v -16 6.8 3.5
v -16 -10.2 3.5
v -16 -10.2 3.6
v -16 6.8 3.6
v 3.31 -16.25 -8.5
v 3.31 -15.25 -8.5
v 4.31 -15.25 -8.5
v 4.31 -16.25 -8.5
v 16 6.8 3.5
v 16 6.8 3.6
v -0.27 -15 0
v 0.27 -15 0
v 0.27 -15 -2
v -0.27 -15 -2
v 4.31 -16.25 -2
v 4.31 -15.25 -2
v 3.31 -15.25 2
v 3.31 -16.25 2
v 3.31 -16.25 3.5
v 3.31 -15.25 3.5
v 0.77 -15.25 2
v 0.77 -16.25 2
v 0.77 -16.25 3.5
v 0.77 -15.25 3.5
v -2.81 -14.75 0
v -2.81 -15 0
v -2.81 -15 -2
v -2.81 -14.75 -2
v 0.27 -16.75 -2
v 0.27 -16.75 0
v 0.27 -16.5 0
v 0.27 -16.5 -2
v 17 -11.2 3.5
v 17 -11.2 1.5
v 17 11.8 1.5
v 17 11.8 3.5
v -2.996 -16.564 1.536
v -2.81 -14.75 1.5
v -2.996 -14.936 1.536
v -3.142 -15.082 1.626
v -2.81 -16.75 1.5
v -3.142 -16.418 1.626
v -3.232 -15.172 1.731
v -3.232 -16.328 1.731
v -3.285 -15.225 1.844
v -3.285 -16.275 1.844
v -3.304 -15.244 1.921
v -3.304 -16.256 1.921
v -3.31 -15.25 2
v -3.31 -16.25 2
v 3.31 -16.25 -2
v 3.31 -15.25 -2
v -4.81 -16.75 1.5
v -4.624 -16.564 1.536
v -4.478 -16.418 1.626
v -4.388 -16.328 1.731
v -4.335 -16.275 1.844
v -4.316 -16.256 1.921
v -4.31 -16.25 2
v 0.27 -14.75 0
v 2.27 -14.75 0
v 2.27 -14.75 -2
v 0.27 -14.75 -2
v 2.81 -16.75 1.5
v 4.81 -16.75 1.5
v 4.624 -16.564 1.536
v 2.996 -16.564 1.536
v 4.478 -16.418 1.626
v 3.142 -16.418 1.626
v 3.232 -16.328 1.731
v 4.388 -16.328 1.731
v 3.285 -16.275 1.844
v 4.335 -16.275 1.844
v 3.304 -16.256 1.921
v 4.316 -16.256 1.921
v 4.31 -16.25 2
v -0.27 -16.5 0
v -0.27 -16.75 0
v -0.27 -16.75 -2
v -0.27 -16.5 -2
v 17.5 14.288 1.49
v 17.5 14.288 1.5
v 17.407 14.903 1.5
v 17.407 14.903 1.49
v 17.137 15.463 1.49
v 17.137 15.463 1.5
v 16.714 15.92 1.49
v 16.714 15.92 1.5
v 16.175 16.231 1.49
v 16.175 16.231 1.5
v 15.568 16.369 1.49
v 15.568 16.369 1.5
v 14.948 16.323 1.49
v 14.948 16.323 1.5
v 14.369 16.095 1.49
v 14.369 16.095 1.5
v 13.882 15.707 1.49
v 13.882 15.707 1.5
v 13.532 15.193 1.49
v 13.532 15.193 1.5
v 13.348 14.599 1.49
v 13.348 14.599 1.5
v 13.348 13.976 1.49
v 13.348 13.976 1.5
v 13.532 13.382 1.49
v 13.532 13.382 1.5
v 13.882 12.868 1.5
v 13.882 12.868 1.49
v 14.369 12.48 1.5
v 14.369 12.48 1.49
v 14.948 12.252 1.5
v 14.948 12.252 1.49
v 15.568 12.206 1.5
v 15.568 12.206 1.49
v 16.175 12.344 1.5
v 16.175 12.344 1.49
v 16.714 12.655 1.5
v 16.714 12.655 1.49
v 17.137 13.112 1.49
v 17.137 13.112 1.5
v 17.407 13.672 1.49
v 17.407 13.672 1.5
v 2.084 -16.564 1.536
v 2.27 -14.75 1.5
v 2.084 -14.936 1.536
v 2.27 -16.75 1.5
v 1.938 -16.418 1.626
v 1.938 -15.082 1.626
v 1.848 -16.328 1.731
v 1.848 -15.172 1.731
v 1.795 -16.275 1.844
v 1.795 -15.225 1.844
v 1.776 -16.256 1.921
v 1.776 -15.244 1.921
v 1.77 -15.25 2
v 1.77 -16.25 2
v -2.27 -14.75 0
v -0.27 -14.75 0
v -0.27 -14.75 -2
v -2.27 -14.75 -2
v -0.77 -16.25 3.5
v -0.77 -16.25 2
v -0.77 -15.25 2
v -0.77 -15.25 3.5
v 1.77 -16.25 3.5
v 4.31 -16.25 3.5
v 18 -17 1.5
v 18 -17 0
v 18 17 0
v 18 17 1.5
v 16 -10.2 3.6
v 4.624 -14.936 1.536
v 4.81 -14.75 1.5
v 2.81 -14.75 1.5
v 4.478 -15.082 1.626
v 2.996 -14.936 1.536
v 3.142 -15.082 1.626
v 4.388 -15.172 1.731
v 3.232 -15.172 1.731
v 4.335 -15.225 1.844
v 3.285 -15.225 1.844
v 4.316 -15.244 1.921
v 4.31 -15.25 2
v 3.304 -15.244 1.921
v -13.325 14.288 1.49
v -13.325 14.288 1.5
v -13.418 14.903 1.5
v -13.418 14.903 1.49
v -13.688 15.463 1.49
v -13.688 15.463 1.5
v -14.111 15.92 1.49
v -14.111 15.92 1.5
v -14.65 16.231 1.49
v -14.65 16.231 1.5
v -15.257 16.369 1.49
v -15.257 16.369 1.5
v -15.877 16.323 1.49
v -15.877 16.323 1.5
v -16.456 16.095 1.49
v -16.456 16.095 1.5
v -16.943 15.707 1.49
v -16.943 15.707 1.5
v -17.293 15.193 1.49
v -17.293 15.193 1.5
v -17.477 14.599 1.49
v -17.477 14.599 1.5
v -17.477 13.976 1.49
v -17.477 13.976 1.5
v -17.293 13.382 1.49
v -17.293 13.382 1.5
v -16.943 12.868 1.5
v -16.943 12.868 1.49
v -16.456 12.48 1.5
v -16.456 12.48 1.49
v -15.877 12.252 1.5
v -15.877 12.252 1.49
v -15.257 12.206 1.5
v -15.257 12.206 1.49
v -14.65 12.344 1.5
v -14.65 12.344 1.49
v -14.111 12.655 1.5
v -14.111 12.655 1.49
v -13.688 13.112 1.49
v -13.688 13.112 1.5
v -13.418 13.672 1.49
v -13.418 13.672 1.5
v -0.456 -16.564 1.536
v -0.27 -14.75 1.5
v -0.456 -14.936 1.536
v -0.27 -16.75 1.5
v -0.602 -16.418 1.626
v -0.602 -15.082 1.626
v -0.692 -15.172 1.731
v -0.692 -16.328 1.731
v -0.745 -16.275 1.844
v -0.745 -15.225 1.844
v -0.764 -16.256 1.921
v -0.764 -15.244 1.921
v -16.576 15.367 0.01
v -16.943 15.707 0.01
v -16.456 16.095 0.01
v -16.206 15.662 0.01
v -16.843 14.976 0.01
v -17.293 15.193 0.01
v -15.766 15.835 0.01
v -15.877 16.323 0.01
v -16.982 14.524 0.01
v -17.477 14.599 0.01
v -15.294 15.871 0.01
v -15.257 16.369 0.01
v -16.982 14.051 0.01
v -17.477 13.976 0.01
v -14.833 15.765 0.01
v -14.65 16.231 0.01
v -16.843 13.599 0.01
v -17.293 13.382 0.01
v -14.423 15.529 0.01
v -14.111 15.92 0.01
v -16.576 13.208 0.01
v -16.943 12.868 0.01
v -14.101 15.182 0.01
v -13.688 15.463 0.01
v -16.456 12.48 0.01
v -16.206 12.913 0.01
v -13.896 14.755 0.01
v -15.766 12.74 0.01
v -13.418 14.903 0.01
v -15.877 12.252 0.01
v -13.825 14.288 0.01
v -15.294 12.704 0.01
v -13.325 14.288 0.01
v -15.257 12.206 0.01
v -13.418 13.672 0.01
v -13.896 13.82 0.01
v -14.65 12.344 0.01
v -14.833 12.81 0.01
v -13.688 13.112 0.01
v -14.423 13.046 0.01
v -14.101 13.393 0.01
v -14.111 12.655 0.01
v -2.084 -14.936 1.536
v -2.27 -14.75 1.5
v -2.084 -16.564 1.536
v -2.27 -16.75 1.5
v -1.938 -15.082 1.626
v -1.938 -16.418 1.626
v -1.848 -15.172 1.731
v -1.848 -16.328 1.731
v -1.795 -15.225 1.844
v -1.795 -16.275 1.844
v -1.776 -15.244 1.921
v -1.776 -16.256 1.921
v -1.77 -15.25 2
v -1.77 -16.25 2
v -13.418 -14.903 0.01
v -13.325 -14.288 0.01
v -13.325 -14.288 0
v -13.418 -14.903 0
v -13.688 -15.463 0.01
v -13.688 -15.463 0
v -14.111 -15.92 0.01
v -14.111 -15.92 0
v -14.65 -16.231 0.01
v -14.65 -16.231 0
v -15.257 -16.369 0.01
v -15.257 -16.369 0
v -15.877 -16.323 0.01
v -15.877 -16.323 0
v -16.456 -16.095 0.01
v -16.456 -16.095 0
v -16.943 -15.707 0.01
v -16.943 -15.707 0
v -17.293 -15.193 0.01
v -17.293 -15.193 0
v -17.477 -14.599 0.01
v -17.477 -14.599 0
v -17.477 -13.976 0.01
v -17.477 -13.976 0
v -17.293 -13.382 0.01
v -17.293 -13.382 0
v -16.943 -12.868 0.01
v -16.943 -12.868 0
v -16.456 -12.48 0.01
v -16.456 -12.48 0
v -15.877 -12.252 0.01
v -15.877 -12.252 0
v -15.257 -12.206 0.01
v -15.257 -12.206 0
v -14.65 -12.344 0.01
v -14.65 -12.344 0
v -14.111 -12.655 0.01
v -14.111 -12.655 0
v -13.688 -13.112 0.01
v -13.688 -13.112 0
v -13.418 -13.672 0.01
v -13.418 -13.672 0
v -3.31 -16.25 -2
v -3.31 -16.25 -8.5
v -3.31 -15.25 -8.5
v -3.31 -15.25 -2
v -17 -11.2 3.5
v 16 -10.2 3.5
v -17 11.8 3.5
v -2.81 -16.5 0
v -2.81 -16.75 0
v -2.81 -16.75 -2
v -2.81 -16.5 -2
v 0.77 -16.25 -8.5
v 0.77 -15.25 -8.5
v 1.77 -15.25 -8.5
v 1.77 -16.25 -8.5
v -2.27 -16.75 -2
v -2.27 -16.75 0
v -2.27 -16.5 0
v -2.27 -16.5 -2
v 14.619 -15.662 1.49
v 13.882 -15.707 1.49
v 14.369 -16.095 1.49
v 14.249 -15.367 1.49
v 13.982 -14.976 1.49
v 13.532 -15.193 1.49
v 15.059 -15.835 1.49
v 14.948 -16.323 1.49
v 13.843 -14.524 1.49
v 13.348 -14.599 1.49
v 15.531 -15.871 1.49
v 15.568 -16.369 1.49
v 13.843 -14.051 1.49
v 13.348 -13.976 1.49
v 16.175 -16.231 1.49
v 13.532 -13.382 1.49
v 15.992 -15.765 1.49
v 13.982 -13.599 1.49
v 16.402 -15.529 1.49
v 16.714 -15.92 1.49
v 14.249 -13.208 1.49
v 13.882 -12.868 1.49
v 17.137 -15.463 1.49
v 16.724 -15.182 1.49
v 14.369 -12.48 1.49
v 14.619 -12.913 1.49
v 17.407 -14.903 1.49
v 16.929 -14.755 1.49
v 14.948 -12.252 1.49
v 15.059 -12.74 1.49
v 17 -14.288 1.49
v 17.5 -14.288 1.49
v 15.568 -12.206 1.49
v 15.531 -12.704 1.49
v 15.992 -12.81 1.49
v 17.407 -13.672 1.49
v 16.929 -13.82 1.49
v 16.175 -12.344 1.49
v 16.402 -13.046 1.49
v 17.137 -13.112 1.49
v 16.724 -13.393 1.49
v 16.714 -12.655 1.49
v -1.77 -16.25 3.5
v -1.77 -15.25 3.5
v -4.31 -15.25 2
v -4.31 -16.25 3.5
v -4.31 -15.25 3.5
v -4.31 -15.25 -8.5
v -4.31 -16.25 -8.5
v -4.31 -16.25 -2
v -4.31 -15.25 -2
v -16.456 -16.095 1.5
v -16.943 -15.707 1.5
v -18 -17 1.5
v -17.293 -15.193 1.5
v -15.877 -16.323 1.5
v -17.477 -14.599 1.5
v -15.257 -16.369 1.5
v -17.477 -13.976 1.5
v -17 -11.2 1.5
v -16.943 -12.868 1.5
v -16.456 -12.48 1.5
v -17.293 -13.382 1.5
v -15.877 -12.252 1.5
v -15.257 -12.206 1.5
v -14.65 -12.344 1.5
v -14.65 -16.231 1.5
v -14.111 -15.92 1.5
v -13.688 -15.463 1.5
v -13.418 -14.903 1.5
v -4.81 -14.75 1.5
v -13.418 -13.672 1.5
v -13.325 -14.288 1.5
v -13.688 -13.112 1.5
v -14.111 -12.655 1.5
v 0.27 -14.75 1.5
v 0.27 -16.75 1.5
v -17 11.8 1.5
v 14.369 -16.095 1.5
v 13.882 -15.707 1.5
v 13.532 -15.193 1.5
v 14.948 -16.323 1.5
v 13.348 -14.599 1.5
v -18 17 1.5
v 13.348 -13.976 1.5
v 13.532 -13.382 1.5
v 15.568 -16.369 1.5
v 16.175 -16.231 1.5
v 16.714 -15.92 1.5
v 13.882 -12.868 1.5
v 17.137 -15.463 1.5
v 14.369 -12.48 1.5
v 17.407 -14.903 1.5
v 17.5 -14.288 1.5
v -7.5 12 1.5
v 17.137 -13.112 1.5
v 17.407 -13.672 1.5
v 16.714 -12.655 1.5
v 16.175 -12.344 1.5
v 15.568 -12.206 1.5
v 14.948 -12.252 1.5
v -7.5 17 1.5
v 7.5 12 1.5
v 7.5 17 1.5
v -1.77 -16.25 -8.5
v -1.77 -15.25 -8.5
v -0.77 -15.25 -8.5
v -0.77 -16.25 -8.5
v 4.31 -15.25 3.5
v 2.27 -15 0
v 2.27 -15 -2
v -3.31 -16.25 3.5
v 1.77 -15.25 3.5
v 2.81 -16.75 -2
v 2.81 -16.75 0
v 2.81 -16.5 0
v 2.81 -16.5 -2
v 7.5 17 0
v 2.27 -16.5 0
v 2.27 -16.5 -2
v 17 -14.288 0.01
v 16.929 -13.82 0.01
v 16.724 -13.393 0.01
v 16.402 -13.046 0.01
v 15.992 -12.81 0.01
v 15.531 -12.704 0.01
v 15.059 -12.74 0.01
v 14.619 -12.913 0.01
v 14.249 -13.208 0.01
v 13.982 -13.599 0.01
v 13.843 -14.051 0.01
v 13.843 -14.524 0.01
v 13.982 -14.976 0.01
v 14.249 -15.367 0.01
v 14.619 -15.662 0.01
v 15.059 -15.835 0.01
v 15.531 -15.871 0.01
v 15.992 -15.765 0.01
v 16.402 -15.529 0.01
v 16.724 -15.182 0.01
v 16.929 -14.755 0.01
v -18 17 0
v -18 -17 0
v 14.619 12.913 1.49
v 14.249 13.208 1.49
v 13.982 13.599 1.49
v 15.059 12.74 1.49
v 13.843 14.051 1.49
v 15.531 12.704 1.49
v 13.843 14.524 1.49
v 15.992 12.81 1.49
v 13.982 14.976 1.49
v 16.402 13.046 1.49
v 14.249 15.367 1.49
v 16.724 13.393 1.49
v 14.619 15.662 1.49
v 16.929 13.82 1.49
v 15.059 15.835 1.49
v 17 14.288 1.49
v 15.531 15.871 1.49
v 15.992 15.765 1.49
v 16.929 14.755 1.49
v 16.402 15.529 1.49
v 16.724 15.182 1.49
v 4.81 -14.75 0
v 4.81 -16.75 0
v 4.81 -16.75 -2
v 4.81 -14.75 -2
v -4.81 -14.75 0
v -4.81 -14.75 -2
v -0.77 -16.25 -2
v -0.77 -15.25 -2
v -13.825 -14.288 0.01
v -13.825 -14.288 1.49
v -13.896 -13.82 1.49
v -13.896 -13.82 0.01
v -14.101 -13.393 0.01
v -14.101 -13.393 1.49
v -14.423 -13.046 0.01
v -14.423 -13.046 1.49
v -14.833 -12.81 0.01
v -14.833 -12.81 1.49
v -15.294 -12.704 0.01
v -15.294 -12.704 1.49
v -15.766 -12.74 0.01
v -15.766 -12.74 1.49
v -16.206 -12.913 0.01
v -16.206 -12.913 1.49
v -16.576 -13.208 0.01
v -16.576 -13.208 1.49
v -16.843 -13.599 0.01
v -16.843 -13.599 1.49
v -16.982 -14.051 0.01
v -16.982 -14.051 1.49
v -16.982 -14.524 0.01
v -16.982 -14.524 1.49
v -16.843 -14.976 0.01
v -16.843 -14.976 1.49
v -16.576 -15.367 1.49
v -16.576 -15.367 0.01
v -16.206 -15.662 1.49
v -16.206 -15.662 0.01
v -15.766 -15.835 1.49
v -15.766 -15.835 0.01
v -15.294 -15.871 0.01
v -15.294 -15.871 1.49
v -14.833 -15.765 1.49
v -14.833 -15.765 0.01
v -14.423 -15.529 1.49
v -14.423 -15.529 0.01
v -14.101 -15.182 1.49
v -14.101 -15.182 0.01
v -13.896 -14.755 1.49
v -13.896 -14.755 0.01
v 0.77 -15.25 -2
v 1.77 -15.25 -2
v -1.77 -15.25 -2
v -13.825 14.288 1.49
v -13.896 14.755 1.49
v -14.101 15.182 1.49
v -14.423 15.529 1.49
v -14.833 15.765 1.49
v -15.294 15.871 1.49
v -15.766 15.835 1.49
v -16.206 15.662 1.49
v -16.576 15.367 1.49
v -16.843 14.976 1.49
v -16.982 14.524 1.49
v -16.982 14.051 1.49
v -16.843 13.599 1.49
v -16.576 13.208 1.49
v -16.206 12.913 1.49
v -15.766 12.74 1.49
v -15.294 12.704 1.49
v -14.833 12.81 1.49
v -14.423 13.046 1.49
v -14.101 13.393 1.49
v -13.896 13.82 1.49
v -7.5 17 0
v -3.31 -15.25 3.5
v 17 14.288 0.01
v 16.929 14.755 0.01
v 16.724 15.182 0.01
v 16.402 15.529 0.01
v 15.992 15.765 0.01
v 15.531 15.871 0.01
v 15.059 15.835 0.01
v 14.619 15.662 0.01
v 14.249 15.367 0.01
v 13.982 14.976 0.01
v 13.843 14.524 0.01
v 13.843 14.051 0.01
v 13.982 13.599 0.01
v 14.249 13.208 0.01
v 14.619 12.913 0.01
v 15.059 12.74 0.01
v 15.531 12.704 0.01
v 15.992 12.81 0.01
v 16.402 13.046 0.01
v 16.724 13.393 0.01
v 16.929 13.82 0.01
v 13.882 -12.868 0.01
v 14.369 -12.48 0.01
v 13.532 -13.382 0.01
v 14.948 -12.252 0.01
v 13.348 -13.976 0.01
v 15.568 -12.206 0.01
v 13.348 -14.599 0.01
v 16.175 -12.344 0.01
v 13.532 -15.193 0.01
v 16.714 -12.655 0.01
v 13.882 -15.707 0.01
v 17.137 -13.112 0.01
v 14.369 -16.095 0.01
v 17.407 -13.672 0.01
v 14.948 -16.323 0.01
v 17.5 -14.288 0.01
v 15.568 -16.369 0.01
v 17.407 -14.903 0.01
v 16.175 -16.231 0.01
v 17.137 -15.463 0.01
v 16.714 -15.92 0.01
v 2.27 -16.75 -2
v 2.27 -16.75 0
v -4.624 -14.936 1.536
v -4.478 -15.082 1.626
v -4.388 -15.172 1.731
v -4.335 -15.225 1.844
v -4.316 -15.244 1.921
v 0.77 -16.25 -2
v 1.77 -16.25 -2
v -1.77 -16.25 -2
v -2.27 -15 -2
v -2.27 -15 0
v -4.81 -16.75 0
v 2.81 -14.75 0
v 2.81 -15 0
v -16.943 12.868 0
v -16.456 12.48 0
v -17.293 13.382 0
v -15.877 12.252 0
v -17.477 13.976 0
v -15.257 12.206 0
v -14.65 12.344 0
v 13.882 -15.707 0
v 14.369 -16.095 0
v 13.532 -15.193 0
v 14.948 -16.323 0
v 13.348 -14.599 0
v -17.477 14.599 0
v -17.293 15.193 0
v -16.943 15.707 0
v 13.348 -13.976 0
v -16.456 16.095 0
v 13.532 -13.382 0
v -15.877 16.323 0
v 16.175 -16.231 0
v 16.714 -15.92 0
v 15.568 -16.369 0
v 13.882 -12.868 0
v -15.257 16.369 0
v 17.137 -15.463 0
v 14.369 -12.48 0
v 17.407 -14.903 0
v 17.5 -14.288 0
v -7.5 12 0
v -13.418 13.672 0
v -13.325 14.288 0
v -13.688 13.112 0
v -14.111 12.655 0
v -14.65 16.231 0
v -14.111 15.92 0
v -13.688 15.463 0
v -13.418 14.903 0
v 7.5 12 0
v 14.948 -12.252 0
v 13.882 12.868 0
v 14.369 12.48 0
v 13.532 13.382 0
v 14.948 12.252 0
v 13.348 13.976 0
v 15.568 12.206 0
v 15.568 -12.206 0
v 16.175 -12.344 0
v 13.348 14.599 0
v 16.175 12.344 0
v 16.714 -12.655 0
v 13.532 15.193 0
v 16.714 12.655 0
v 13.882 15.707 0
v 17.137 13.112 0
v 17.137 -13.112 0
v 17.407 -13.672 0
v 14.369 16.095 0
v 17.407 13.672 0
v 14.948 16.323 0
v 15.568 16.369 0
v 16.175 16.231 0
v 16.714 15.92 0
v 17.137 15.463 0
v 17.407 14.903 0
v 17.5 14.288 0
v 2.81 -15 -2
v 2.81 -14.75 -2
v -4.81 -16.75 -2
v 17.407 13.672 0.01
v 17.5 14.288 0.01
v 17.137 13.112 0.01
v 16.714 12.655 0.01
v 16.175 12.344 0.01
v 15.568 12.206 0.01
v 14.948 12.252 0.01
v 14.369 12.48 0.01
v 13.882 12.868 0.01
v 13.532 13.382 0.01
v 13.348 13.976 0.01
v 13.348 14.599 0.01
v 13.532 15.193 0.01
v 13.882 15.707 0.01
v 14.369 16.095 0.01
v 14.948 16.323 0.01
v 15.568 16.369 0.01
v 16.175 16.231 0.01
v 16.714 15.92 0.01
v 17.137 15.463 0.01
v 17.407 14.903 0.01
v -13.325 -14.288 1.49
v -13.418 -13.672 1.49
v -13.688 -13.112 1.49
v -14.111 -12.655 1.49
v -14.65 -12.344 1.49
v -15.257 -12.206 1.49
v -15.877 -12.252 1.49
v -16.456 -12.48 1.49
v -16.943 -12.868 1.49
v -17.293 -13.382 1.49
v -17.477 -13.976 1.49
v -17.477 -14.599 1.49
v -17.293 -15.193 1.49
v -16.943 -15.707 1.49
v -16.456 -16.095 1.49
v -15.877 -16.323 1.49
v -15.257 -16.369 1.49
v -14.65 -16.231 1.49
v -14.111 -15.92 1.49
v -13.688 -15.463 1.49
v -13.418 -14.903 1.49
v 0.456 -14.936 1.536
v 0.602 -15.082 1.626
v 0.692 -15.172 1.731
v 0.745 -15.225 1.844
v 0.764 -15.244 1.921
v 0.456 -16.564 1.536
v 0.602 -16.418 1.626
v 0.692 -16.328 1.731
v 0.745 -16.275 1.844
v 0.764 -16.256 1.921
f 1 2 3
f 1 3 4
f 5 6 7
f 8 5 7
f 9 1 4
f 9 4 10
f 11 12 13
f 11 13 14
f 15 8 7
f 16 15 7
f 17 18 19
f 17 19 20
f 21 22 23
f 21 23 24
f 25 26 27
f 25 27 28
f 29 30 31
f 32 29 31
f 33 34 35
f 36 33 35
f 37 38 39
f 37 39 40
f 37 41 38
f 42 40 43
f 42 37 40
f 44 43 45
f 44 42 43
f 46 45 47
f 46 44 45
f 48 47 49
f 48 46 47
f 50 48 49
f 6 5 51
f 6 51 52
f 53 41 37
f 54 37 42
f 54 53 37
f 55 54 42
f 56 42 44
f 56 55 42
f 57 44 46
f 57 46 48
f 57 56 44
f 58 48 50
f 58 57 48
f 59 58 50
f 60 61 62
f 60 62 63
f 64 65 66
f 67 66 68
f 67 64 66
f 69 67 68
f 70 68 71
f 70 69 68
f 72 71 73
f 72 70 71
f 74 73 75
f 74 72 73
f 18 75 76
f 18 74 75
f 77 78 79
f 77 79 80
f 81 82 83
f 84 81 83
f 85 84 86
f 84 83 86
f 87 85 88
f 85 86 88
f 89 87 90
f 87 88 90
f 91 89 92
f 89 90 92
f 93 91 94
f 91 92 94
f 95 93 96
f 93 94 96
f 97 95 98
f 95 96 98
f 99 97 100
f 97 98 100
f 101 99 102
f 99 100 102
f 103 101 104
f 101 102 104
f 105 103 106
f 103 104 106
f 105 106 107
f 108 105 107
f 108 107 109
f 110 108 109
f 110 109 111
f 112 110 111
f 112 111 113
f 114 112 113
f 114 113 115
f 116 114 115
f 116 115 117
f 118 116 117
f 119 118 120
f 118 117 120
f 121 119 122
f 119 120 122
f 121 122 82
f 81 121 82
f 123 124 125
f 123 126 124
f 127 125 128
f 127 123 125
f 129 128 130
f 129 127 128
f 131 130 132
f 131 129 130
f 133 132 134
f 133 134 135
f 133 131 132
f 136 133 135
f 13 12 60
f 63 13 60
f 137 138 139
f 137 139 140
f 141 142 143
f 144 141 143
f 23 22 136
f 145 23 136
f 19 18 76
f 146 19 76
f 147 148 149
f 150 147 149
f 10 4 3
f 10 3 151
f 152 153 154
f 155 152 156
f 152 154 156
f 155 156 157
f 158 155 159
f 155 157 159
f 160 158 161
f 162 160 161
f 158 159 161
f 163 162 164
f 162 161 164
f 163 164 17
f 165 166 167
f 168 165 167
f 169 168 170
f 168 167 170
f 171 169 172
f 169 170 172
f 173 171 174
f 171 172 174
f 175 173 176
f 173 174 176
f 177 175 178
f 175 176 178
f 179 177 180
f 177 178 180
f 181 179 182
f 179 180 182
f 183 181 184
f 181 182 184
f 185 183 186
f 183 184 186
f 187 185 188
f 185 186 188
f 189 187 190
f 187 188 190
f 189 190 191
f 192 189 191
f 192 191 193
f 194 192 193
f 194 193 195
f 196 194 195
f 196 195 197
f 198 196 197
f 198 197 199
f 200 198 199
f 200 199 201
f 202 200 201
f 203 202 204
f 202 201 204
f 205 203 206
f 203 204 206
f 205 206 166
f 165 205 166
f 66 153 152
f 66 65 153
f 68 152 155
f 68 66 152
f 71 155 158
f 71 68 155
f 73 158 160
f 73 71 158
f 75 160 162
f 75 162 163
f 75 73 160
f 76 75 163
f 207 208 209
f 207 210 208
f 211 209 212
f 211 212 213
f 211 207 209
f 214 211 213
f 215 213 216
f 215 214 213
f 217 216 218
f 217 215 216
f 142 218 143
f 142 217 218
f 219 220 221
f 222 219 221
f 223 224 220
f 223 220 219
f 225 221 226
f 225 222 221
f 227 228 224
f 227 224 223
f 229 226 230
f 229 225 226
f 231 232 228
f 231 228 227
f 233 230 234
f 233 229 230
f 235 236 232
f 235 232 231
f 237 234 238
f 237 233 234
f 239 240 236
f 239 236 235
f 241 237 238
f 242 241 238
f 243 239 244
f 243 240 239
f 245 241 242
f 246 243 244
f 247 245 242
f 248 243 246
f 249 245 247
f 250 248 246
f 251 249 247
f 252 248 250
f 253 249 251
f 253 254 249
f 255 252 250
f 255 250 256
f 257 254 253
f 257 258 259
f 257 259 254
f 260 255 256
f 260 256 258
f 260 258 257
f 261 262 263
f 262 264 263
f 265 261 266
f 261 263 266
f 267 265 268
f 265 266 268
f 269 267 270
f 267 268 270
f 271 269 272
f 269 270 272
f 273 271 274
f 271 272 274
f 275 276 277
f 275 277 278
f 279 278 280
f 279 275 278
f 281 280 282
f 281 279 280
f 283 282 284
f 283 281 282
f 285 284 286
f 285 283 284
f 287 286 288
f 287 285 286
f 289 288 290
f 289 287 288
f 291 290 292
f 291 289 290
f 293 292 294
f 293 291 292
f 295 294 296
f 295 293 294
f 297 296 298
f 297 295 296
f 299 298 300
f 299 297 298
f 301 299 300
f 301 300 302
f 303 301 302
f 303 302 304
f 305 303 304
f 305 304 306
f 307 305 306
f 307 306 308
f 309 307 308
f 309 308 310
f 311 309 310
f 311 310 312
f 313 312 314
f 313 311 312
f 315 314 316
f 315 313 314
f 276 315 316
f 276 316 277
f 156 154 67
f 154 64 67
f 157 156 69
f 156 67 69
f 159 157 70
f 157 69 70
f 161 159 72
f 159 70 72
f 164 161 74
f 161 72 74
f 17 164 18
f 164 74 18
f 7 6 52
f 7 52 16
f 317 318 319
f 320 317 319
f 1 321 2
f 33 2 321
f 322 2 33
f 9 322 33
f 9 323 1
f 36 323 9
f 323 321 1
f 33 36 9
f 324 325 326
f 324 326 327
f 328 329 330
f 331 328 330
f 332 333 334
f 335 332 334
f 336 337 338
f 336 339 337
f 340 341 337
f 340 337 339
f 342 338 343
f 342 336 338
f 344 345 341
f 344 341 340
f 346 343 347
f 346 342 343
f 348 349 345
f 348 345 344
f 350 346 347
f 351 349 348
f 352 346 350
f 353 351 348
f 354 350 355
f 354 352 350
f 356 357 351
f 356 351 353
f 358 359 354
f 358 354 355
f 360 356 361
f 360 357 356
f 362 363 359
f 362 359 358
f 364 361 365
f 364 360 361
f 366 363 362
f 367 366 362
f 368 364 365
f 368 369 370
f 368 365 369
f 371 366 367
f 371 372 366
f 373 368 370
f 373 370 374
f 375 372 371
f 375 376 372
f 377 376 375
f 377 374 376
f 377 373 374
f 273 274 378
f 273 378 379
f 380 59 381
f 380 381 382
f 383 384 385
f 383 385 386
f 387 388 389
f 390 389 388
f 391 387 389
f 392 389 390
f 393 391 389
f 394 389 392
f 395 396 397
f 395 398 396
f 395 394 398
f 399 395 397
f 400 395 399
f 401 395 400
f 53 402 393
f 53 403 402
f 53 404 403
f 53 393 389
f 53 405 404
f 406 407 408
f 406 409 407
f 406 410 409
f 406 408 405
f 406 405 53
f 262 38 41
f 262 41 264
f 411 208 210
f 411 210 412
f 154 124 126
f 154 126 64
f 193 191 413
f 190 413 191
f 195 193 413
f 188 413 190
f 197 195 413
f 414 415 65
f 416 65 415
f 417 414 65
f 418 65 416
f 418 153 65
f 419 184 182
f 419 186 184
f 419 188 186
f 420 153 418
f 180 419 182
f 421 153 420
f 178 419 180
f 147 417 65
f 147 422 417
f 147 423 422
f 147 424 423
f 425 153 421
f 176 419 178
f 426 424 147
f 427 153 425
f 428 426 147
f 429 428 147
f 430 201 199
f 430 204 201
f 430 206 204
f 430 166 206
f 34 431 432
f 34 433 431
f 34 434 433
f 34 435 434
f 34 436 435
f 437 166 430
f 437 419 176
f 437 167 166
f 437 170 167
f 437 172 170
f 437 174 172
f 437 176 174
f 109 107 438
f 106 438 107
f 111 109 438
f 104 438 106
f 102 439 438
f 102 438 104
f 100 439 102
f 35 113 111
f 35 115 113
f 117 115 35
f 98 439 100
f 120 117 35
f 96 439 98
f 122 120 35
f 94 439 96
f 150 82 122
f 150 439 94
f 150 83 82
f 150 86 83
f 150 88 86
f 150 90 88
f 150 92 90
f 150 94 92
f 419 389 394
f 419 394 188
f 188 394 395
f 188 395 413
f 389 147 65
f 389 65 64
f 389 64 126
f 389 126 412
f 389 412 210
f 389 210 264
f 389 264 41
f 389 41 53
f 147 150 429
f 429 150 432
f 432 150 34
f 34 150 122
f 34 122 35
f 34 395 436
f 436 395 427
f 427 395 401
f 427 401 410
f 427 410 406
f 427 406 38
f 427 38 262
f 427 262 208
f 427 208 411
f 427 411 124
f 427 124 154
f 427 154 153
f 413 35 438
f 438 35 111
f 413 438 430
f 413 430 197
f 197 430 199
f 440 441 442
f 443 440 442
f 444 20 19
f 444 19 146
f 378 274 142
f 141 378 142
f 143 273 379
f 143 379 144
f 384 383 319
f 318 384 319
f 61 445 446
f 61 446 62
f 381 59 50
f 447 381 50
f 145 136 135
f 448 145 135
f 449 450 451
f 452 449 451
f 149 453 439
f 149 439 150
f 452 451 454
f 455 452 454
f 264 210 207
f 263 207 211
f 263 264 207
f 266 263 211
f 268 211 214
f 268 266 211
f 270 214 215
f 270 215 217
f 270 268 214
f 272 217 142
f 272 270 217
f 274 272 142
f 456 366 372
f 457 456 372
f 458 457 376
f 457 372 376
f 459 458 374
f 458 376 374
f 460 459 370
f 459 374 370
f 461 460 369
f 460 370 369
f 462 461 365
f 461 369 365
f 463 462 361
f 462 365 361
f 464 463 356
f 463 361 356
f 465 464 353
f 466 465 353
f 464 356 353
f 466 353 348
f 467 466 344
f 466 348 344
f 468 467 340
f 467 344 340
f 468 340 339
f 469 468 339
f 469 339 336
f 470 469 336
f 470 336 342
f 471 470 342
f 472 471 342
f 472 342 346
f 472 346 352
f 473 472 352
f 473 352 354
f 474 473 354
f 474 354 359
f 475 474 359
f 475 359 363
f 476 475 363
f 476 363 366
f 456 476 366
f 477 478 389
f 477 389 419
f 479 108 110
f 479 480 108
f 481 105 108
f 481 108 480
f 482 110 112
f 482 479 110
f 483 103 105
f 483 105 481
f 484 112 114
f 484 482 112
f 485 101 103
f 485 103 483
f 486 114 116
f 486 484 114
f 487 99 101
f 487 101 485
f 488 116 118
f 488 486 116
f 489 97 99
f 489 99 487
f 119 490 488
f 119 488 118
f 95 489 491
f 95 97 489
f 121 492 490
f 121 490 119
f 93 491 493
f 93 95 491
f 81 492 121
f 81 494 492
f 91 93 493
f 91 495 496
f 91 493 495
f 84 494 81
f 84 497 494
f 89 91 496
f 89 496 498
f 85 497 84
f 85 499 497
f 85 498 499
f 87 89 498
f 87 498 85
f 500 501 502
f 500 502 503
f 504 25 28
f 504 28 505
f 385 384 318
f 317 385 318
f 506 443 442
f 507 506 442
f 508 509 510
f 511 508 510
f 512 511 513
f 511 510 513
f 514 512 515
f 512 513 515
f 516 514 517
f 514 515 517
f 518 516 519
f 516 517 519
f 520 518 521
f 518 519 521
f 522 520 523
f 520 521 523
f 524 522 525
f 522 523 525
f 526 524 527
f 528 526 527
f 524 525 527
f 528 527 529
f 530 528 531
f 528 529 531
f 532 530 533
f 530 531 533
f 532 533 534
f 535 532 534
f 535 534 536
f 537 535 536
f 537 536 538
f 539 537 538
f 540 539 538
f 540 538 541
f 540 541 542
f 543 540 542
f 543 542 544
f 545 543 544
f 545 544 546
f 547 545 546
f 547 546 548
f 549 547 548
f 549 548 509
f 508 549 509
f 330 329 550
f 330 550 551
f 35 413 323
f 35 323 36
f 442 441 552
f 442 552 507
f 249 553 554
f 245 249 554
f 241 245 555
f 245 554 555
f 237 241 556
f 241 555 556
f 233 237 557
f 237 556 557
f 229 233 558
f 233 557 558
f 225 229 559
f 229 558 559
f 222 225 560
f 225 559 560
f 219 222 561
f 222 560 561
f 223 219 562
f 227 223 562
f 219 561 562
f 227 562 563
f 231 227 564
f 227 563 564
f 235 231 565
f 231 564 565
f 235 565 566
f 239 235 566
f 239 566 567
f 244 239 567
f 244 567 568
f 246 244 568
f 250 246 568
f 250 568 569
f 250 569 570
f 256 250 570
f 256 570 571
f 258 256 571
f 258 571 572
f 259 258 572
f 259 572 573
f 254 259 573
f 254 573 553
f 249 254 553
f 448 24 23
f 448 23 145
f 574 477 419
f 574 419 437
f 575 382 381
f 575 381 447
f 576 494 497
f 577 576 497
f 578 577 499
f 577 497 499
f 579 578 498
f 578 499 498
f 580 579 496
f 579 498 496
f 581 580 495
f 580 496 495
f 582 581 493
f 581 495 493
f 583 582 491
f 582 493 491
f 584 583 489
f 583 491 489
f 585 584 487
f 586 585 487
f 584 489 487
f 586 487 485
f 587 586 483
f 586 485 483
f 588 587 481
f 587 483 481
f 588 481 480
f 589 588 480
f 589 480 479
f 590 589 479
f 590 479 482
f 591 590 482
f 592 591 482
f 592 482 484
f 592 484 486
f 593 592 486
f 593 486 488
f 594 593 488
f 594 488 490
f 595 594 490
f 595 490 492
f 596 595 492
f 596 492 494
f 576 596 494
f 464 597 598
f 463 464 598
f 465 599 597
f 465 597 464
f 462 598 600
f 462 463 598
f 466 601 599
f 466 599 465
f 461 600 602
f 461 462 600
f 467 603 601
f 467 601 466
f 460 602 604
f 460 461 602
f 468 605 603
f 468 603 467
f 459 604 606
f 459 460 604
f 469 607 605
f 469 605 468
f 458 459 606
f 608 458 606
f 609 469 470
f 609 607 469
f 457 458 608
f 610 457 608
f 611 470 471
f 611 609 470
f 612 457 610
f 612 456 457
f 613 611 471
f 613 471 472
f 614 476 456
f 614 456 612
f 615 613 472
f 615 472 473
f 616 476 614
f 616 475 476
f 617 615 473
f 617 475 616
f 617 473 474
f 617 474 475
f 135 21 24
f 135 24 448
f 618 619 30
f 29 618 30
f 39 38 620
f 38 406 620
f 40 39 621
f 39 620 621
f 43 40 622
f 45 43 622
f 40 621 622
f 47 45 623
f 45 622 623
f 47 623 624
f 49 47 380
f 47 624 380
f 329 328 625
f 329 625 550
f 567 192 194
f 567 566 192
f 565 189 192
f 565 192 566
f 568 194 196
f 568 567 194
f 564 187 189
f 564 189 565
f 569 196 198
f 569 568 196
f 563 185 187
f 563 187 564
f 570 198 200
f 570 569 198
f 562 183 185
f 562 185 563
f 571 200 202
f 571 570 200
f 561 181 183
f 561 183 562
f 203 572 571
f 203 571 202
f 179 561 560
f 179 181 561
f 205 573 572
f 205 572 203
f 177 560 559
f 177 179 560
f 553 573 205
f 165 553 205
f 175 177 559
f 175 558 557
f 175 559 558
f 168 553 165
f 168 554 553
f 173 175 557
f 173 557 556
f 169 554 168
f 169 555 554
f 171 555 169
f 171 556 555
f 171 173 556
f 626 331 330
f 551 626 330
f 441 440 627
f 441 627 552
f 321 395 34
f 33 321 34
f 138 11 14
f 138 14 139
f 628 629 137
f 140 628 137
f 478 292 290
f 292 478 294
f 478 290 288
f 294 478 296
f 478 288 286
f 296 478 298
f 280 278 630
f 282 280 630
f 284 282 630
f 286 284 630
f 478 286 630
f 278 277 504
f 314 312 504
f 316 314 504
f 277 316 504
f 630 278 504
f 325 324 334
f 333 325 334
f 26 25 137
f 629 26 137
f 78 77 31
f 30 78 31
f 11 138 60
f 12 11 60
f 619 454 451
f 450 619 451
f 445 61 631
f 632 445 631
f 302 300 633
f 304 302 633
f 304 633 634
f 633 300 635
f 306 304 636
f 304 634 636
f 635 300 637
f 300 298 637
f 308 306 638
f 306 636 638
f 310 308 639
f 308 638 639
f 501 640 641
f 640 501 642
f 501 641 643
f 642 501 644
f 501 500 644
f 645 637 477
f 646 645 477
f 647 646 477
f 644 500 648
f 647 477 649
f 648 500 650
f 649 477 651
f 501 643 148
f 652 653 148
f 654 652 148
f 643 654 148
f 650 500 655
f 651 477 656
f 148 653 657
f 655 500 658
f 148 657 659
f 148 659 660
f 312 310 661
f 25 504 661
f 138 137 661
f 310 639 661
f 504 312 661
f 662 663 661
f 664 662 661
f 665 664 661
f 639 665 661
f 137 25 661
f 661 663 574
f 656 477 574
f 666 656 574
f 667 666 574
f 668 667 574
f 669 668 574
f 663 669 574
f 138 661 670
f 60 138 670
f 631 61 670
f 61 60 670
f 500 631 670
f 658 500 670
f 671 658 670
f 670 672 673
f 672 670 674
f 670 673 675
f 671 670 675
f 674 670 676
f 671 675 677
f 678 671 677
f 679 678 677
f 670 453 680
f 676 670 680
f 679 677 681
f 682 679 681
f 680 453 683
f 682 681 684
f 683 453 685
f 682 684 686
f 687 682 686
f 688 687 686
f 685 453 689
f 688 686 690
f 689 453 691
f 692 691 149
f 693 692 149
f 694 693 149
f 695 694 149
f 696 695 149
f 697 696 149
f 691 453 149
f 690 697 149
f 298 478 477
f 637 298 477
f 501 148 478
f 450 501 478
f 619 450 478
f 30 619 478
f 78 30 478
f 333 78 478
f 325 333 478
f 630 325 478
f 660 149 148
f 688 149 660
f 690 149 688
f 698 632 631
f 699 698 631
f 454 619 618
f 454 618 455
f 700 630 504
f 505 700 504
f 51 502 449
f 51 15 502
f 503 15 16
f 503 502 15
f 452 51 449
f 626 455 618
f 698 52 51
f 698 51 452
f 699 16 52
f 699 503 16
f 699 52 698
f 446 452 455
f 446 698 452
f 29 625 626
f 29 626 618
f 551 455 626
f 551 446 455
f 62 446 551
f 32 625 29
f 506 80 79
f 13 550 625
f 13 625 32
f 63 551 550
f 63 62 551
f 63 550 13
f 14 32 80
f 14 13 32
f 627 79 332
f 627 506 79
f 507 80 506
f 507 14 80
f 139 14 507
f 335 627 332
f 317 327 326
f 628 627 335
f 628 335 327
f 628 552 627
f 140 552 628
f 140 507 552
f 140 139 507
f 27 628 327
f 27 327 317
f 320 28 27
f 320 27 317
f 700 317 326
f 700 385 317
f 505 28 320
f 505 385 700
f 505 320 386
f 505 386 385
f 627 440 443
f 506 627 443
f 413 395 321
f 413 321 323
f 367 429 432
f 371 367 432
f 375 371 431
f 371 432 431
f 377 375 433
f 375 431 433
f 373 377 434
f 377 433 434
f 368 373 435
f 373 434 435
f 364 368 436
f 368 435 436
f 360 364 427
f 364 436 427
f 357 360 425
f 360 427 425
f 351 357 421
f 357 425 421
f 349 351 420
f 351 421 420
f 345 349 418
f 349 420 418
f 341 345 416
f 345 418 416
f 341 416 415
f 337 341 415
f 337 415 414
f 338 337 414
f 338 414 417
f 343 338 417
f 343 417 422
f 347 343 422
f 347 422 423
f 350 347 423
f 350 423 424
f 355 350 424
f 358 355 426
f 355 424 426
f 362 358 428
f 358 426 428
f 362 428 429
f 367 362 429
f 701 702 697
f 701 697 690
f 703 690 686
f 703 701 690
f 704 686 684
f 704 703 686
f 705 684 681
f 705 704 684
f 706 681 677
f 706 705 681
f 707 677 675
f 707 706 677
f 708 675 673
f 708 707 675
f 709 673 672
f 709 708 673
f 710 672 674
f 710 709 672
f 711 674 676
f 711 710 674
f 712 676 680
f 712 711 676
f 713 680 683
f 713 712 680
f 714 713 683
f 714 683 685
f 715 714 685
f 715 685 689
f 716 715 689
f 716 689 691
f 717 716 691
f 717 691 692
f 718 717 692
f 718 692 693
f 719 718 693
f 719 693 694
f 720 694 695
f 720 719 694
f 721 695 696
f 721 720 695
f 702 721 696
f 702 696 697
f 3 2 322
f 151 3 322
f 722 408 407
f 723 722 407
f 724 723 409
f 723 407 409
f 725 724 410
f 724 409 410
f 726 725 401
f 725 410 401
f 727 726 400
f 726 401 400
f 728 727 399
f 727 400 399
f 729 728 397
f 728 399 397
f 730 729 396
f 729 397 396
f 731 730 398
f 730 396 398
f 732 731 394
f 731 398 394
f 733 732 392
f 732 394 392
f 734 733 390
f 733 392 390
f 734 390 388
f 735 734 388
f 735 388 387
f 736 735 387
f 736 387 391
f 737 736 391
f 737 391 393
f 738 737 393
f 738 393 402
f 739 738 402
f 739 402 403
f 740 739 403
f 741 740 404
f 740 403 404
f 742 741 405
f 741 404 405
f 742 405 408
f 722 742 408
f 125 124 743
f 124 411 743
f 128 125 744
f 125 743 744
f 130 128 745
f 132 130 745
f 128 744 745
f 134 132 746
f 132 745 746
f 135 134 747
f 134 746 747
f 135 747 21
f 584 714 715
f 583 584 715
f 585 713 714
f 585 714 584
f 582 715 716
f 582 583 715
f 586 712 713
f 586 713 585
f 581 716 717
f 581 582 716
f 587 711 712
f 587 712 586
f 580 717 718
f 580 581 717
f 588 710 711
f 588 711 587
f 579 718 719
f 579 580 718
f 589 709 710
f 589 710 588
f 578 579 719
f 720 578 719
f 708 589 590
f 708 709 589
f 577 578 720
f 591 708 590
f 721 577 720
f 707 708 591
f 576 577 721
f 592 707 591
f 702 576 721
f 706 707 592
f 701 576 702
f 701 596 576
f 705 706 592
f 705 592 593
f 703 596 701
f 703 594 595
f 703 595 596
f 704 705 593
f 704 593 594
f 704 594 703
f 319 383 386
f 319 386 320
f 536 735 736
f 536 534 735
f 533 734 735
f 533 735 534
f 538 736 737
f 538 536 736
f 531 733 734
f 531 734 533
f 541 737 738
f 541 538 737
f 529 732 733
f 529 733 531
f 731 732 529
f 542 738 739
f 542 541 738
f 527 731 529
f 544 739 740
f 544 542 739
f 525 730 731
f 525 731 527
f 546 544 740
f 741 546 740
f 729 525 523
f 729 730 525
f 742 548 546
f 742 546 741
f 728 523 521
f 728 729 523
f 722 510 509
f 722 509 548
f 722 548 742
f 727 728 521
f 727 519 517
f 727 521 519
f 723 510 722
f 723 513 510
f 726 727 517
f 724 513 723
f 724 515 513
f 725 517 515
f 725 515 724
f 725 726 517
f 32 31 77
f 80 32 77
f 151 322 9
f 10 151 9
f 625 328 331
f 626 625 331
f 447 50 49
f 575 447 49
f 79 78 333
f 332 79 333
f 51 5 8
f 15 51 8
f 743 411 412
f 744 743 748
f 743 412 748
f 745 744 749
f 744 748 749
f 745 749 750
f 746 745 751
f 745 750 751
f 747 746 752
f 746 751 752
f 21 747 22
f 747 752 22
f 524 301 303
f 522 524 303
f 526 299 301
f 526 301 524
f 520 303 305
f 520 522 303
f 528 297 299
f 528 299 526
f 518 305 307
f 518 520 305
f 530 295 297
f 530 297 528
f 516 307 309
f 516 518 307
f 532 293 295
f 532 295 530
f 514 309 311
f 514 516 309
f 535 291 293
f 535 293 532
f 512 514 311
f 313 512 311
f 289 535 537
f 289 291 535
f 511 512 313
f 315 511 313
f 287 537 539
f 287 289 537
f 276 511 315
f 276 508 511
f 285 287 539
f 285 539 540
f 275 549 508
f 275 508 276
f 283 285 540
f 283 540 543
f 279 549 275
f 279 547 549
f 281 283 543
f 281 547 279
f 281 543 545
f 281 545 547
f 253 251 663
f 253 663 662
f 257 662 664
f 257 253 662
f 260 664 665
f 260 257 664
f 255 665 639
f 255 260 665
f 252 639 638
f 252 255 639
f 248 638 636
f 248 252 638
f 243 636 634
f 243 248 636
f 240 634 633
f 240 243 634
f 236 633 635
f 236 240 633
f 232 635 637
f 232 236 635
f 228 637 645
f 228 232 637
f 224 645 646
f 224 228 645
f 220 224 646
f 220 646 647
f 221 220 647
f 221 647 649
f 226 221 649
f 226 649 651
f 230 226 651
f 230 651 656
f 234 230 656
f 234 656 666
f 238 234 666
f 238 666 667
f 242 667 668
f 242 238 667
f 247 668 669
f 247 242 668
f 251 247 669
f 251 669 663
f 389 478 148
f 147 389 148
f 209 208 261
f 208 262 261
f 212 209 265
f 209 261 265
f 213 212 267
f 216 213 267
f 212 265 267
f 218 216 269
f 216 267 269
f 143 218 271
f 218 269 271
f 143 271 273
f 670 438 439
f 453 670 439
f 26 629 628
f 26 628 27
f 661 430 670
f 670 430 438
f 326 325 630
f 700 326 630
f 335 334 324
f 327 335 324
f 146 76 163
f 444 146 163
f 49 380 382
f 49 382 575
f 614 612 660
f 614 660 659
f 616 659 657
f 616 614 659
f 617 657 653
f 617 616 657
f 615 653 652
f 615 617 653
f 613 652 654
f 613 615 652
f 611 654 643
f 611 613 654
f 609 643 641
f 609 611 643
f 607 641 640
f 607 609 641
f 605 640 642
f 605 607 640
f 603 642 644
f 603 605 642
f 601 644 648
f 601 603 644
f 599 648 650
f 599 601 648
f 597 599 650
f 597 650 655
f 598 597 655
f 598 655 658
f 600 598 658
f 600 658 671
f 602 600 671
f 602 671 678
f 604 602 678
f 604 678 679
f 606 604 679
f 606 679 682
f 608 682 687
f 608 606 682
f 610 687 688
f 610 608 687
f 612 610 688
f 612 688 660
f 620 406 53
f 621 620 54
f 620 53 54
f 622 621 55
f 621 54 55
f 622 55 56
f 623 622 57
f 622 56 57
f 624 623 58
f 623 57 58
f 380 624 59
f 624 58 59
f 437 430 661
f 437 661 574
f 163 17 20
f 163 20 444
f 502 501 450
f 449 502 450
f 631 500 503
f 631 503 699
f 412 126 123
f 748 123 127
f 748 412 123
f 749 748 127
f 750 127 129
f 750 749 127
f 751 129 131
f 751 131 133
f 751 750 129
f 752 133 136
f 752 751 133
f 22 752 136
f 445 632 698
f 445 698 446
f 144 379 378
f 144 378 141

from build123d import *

# Parameters (mm, degrees)
CROQUIS1_W                   = 36
CROQUIS1_H                   = 34
SALIENTE_EXTRUIR1_DEPTH      = 1.5
CROQUIS2_W                   = 15
CROQUIS2_H                   = 5
CORTAR_EXTRUIR1_DEPTH        = 1.5
CROQUIS3_R                   = 1.5875
CORTAR_EXTRUIR2_DEPTH        = 2.54
CROQUIS4_W                   = 34
CROQUIS4_H                   = 23
SALIENTE_EXTRUIR2_DEPTH      = 2
CROQUIS5_W                   = 32
CROQUIS5_H                   = 17
SALIENTE_EXTRUIR5_DEPTH      = 0.1
SALIENTE_EXTRUIR7_DEPTH      = 2
SALIENTE_EXTRUIR7_DEPTH_BACK = 10
CROQUIS15_W                  = 1
CROQUIS15_H                  = 1
CROQUIS16_W                  = 2
CROQUIS16_H                  = 2
SALIENTE_EXTRUIR8_DEPTH      = 2
CROQUIS17_W                  = 9.62
CROQUIS17_H                  = 1.5
SALIENTE_EXTRUIR9_DEPTH      = 2
REDONDEO1_R                  = 0.5
CROQUIS41_R                  = 2.0875
CORTAR_EXTRUIR4_DEPTH        = 0.01
CORTAR_EXTRUIR5_START        = -0.01
CROQUIS42_R                  = 2.0875
CORTAR_EXTRUIR5_DEPTH        = 0.01


with BuildPart() as part:
    # Croquis1 → Saliente-Extruir1 (new body)
    with BuildSketch(Plane.XY):
        Rectangle(CROQUIS1_W, CROQUIS1_H)
    extrude(amount=SALIENTE_EXTRUIR1_DEPTH)

    # Croquis2 → Cortar-Extruir1 (cut)
    with BuildSketch(Plane.XY.offset(1.5)):
        with Locations((0, 14.5)):
            Rectangle(CROQUIS2_W, CROQUIS2_H)
    extrude(amount=-CORTAR_EXTRUIR1_DEPTH, mode=Mode.SUBTRACT)

    # Croquis3 → Cortar-Extruir2 (cut)
    with BuildSketch(Plane.XY.offset(1.5)):
        with Locations((-15.4125, 14.2875)):
            Circle(CROQUIS3_R)
        with Locations((15.4125, 14.2875)):
            Circle(CROQUIS3_R)
        with Locations((15.4125, -14.2875)):
            Circle(CROQUIS3_R)
        with Locations((-15.4125, -14.2875)):
            Circle(CROQUIS3_R)
    extrude(amount=-CORTAR_EXTRUIR2_DEPTH, mode=Mode.SUBTRACT)

    # Croquis4 → Saliente-Extruir2 (add)
    with BuildSketch(Plane.XY.offset(1.5)):
        with Locations((0, 0.3)):
            Rectangle(CROQUIS4_W, CROQUIS4_H)
    extrude(amount=SALIENTE_EXTRUIR2_DEPTH)

    # Croquis5 → Saliente-Extruir5 (add)
    with BuildSketch(Plane.XY.offset(3.5)):
        with Locations((0, -1.7)):
            Rectangle(CROQUIS5_W, CROQUIS5_H)
    extrude(amount=SALIENTE_EXTRUIR5_DEPTH)

    # Croquis15 → Saliente-Extruir7 (add, two sides: drawn at the far end of the back side and taken through both)
    with BuildSketch(Plane.XY.offset(1.5).offset(-SALIENTE_EXTRUIR7_DEPTH_BACK)):
        with Locations((1.27, -15.75)):
            Rectangle(CROQUIS15_W, CROQUIS15_H)
        with Locations((3.81, -15.75)):
            Rectangle(CROQUIS15_W, CROQUIS15_H)
        with Locations((-1.27, -15.75)):
            Rectangle(CROQUIS15_W, CROQUIS15_H)
        with Locations((-3.81, -15.75)):
            Rectangle(CROQUIS15_W, CROQUIS15_H)
    extrude(amount=SALIENTE_EXTRUIR7_DEPTH + SALIENTE_EXTRUIR7_DEPTH_BACK)

    # Croquis16 → Saliente-Extruir8 (add)
    with BuildSketch(Plane(origin=(0, 0, 0), x_dir=(-1, 0, 0), z_dir=(0, 0, -1))):
        with Locations((3.81, -15.75)):
            Rectangle(CROQUIS16_W, CROQUIS16_H)
        with Locations((1.27, -15.75)):
            Rectangle(CROQUIS16_W, CROQUIS16_H)
        with Locations((-1.27, -15.75)):
            Rectangle(CROQUIS16_W, CROQUIS16_H)
        with Locations((-3.81, -15.75)):
            Rectangle(CROQUIS16_W, CROQUIS16_H)
    extrude(amount=SALIENTE_EXTRUIR8_DEPTH)

    # Croquis17 → Saliente-Extruir9 (add)
    with BuildSketch(Plane(origin=(0, 0, 0), x_dir=(-1, 0, 0), z_dir=(0, 0, -1))):
        with Locations((0, -15.75)):
            Rectangle(CROQUIS17_W, CROQUIS17_H)
    extrude(amount=SALIENTE_EXTRUIR9_DEPTH)

    # Redondeo1
    redondeo1_edges = [part.edges().sort_by_distance(p)[0] for p in [
        (0.77, -15.75, 1.5),
        (1.27, -15.25, 1.5),
        (1.77, -15.75, 1.5),
        (1.27, -16.25, 1.5),
        (-1.77, -15.75, 1.5),
        (-1.27, -15.25, 1.5),
        (-0.77, -15.75, 1.5),
        (-1.27, -16.25, 1.5),
        (-4.31, -15.75, 1.5),
        (-3.81, -15.25, 1.5),
        (-3.31, -15.75, 1.5),
        (-3.81, -16.25, 1.5),
        (3.31, -15.75, 1.5),
        (3.81, -15.25, 1.5),
        (4.31, -15.75, 1.5),
        (3.81, -16.25, 1.5),
    ]]
    fillet(redondeo1_edges, radius=REDONDEO1_R)

    # Croquis41 → Cortar-Extruir4 (cut)
    with BuildSketch(Plane.XY.offset(1.5)):
        with Locations((-15.4125, 14.2875)):
            Circle(CROQUIS41_R)
        with Locations((15.4125, 14.2875)):
            Circle(CROQUIS41_R)
        with Locations((15.4125, -14.2875)):
            Circle(CROQUIS41_R)
        with Locations((-15.4125, -14.2875)):
            Circle(CROQUIS41_R)
    extrude(amount=-CORTAR_EXTRUIR4_DEPTH, mode=Mode.SUBTRACT)

    # Croquis42 → Cortar-Extruir5 (cut)
    with BuildSketch(Plane(origin=(0, 0, 0), x_dir=(-1, 0, 0), z_dir=(0, 0, -1)).offset(CORTAR_EXTRUIR5_START)):
        with Locations(Location((-15.4125, 14.2875, 0), (0, 0, 180))):
            Circle(CROQUIS42_R)
        with Locations(Location((15.4125, 14.2875, 0), (0, 0, 180))):
            Circle(CROQUIS42_R)
        with Locations(Location((15.4125, -14.2875, 0), (0, 0, 180))):
            Circle(CROQUIS42_R)
        with Locations(Location((-15.4125, -14.2875, 0), (0, 0, 180))):
            Circle(CROQUIS42_R)
    extrude(amount=CORTAR_EXTRUIR5_DEPTH, mode=Mode.SUBTRACT)


solid = part.part
